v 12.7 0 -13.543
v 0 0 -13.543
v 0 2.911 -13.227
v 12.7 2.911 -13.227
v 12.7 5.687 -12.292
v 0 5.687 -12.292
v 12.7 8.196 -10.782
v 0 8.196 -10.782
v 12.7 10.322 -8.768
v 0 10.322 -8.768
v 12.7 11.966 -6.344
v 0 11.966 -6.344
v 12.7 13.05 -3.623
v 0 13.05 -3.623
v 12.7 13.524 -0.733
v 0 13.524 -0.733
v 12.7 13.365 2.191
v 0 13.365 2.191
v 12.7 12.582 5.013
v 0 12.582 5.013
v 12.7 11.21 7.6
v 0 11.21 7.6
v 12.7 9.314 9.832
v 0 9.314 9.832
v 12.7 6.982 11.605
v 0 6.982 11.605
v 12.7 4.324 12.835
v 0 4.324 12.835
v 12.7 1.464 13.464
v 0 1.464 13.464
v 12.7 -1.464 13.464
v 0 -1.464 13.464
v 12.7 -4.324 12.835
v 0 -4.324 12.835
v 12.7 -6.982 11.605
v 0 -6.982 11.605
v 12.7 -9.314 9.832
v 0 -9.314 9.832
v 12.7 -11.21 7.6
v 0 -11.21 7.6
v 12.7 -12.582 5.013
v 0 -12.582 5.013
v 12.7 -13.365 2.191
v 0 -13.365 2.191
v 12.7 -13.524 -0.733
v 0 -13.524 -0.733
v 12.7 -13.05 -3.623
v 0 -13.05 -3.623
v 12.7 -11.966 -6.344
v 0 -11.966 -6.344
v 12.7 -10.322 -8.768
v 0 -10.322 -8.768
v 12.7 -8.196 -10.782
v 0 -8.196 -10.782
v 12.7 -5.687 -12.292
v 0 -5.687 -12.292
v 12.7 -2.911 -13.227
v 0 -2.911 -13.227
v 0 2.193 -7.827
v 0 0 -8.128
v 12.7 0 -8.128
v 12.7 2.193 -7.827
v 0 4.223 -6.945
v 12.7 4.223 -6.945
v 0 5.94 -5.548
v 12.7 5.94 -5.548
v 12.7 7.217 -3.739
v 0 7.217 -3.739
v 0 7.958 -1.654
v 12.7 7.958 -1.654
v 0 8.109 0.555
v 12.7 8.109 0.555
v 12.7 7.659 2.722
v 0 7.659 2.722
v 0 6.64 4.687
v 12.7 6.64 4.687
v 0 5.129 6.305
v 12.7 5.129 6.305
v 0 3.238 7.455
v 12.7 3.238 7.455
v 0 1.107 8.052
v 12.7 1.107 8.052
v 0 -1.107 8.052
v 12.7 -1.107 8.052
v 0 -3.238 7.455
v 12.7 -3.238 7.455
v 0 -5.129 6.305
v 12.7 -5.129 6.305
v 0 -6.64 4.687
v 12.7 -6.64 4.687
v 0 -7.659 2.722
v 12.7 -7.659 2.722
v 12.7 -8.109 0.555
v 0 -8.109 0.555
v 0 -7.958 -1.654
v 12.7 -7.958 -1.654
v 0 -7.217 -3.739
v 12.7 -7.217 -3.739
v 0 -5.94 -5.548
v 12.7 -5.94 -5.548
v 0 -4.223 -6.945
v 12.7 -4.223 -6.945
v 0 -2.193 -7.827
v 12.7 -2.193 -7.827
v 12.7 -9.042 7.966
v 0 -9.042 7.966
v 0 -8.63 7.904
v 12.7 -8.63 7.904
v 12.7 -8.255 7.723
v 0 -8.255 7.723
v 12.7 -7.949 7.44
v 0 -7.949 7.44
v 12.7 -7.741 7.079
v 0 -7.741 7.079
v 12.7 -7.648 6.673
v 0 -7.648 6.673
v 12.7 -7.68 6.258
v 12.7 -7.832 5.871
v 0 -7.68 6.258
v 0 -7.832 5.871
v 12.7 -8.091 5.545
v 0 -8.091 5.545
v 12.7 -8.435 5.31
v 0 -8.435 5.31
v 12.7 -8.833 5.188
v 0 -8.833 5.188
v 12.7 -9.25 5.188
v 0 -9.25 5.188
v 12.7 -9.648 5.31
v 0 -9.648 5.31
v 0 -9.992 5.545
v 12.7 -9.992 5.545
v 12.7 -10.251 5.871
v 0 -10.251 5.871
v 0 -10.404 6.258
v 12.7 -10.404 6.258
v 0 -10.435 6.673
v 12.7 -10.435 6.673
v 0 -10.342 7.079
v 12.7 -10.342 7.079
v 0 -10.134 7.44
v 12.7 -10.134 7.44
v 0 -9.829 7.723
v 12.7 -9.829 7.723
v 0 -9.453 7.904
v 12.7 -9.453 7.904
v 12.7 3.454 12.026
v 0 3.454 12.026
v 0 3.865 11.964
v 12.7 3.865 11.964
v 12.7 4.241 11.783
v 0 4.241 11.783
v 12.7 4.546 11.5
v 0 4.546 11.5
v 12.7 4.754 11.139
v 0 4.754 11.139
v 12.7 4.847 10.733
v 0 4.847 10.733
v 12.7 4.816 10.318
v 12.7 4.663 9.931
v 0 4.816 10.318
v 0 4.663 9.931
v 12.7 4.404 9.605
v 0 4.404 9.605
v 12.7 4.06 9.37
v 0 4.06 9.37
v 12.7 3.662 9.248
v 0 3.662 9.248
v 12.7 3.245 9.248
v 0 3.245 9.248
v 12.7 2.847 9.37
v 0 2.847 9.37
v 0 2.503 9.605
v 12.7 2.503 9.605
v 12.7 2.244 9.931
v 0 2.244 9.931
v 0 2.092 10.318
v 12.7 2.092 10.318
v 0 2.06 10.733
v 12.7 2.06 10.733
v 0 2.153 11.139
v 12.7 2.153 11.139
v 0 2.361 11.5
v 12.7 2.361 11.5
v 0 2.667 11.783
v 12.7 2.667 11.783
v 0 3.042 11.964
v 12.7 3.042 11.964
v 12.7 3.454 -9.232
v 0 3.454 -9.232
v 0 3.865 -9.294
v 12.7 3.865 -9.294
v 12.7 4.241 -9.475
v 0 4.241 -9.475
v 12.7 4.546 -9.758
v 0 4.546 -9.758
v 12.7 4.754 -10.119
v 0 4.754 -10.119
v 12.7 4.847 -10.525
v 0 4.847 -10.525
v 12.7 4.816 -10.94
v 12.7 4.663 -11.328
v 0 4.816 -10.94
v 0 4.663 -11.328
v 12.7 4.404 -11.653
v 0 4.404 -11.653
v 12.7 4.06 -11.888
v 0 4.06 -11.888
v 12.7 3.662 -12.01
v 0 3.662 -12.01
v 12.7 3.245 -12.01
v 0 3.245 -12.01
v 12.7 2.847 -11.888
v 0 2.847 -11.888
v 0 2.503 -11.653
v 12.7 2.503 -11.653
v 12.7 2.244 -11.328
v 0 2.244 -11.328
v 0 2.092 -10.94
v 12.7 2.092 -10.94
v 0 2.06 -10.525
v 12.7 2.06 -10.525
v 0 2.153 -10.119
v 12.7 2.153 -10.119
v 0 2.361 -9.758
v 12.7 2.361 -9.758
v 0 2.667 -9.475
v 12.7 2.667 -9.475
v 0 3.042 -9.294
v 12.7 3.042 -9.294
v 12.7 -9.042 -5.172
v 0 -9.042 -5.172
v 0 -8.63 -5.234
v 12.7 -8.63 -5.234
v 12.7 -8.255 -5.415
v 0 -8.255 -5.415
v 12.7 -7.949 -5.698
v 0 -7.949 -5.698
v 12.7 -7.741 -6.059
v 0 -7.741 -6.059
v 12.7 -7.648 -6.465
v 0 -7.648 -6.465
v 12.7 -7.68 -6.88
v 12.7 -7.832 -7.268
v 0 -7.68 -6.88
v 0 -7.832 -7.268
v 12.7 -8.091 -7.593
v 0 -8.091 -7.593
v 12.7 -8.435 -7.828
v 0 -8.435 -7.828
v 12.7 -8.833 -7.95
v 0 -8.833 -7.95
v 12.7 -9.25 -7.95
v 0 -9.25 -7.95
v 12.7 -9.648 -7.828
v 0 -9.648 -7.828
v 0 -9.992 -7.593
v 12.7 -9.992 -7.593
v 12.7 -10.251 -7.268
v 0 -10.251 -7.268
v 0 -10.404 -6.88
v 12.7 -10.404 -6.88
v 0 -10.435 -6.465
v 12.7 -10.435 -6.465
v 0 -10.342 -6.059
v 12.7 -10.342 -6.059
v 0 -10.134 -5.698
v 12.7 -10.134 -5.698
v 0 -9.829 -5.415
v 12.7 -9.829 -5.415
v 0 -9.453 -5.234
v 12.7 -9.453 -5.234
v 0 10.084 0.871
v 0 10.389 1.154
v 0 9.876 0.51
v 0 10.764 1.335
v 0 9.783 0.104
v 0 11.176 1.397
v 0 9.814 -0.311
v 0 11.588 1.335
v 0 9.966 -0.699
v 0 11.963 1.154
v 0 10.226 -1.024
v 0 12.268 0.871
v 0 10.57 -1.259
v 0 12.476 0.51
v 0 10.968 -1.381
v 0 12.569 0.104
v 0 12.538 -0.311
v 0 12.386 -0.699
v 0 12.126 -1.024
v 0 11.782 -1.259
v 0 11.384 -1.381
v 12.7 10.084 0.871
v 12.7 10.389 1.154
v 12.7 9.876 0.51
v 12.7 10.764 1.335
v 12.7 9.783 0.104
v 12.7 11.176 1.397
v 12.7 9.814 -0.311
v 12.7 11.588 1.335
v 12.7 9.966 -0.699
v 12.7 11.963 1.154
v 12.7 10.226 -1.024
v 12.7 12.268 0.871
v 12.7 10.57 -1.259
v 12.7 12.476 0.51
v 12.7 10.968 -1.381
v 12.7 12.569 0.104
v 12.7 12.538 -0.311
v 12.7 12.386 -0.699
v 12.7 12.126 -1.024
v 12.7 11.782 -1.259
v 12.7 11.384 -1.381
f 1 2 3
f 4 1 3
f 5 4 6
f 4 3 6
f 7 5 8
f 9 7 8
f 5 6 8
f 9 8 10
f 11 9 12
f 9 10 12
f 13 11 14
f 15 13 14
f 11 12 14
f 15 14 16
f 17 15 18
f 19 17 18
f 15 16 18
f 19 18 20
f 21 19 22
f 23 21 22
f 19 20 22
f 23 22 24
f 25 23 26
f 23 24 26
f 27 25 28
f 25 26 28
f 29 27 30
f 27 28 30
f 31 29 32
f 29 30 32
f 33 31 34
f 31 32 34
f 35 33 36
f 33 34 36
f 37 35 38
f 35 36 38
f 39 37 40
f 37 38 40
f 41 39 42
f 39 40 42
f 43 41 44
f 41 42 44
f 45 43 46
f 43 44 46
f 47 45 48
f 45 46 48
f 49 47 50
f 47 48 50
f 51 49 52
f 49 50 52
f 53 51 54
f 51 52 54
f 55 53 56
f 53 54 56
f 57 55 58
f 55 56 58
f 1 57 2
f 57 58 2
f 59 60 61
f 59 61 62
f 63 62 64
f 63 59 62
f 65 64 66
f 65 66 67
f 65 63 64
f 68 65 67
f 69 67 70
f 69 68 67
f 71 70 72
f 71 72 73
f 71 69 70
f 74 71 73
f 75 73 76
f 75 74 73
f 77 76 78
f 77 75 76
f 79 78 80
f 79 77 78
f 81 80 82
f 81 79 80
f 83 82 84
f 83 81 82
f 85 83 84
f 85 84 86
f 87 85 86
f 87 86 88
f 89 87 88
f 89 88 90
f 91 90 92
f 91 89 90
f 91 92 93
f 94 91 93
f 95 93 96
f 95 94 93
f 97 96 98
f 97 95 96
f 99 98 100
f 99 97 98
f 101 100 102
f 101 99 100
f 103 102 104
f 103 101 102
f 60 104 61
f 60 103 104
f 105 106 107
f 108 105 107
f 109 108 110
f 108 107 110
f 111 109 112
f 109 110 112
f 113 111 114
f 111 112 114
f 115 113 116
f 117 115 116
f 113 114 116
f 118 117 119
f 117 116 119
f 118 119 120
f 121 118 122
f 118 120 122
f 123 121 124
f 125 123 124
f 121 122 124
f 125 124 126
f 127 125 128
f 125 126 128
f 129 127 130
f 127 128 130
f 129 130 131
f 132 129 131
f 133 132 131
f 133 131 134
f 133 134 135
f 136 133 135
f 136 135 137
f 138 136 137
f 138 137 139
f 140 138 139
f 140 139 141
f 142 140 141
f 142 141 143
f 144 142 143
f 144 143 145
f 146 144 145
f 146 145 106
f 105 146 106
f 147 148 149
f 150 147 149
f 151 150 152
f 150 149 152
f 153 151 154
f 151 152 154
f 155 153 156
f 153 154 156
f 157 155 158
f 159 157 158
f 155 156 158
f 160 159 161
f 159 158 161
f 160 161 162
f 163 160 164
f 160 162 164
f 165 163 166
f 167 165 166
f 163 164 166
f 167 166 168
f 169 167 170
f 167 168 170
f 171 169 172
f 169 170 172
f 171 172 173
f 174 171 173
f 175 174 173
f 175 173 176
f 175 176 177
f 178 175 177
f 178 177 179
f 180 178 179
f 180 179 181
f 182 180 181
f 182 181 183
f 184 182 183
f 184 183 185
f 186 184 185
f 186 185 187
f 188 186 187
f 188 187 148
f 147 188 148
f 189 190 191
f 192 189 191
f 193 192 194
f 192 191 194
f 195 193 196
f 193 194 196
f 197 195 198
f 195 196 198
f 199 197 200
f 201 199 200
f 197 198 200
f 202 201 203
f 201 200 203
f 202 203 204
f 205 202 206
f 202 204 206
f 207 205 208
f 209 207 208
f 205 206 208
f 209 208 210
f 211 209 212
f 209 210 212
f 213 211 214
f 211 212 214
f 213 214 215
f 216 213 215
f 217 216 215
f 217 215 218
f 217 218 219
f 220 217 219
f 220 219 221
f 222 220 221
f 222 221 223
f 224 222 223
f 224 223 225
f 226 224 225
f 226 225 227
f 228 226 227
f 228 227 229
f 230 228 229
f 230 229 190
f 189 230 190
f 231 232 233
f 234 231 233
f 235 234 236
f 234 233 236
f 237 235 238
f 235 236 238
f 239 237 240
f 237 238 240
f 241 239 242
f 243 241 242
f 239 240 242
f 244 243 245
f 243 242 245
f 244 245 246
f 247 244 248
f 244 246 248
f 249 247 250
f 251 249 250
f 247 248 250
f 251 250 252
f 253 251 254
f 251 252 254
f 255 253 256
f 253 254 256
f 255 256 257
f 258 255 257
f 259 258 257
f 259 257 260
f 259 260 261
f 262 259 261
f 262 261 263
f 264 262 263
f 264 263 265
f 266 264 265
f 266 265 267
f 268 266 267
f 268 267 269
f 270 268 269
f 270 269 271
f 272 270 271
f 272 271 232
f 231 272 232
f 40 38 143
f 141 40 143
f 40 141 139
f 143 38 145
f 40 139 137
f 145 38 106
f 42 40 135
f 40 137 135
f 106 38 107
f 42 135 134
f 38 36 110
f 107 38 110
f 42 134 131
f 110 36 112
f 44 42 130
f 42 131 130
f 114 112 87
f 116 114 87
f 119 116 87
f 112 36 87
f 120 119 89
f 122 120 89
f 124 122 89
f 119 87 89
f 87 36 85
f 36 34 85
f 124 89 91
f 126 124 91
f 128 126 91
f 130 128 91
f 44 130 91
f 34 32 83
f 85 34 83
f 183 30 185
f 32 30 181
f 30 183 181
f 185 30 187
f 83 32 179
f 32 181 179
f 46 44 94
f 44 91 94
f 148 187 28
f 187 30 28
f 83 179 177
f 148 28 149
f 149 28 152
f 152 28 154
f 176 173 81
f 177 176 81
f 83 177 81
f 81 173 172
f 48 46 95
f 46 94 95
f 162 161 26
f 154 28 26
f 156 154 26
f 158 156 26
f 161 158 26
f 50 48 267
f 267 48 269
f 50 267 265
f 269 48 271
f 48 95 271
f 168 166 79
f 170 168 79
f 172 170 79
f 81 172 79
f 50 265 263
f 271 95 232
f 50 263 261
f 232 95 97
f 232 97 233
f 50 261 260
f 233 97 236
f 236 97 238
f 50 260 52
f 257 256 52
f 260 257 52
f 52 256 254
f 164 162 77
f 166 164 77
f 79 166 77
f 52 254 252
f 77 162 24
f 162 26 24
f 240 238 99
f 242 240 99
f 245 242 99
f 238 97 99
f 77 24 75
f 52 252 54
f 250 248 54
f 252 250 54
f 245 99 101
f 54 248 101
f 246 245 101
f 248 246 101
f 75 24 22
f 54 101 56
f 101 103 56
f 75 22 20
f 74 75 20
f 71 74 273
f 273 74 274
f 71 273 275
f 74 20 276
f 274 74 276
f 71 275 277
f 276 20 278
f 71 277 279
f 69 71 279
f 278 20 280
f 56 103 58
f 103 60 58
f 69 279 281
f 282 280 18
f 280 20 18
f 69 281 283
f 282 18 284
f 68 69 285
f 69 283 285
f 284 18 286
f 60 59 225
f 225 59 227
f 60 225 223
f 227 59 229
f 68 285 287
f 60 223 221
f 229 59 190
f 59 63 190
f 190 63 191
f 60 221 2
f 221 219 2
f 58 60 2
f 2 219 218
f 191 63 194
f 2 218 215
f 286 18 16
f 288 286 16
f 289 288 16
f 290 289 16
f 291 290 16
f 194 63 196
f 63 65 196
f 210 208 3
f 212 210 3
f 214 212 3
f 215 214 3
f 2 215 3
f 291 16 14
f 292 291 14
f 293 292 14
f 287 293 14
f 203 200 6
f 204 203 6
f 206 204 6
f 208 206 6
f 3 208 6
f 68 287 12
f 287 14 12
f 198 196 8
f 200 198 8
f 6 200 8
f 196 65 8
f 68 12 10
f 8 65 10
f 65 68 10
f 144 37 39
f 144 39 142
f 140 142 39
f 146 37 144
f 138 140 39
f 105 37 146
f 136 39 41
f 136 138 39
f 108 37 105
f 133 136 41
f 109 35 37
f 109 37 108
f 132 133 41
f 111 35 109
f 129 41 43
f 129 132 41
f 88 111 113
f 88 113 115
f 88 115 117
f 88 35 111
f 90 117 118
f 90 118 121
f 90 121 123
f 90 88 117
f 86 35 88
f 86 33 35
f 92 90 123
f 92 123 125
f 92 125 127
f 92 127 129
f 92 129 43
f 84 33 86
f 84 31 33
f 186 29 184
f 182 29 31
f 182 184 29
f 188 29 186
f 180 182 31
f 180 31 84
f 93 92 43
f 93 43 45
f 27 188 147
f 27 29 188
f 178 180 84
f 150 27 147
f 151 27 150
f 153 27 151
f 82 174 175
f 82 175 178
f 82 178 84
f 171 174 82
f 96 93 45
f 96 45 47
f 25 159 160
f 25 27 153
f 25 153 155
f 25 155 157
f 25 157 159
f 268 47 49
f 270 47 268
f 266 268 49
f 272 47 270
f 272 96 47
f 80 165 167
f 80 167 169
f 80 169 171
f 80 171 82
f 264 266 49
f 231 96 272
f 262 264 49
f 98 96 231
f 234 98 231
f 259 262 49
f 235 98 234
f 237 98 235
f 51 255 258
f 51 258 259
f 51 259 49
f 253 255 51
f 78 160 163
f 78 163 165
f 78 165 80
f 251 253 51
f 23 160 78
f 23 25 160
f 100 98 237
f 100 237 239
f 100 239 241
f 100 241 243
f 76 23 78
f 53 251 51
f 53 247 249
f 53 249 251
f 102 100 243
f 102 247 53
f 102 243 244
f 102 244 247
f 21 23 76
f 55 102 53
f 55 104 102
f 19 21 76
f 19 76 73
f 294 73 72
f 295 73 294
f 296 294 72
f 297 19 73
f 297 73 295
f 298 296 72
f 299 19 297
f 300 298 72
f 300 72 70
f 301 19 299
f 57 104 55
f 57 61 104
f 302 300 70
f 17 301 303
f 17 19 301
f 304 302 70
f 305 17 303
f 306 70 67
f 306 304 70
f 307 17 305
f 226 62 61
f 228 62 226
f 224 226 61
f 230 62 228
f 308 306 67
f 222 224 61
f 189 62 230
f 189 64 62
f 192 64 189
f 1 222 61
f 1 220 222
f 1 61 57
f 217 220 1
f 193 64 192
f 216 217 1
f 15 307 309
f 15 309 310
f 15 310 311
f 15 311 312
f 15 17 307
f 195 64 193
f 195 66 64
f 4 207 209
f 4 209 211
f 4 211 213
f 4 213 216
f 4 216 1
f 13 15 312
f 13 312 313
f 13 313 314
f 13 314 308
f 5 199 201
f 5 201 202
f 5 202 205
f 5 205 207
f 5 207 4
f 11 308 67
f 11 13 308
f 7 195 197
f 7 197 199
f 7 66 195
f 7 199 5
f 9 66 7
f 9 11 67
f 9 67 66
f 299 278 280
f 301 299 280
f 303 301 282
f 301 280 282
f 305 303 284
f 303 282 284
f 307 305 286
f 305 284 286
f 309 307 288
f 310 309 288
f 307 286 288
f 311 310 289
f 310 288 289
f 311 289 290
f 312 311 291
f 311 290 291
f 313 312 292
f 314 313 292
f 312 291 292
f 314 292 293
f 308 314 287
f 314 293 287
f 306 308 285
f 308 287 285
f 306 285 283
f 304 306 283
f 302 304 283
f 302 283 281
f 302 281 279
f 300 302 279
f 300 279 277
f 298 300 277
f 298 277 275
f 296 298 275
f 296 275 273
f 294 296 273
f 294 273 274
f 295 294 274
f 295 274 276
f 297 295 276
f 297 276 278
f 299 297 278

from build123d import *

# Parameters (mm, degrees)
SKETCH1_R           = 13.543461356
SKETCH1_R_2         = 8.128
BOSS_EXTRUDE1_DEPTH = 12.7
SKETCH2_R           = 1.397
CUT_EXTRUDE1_DEPTH  = 13.7


with BuildPart() as part:
    # Sketch1 → Boss-Extrude1 (new body)
    with BuildSketch(Plane(origin=(0, 0, 0), x_dir=(0, 0, -1), z_dir=(1, 0, 0))):
        Circle(SKETCH1_R)
        Circle(SKETCH1_R_2, mode=Mode.SUBTRACT)
    extrude(amount=BOSS_EXTRUDE1_DEPTH)

    # Sketch2 → Cut-Extrude1 (cut, through all)
    with BuildSketch(Plane.ZY):
        with Locations((0, 11.176)):
            Circle(SKETCH2_R)
        with Locations((10.629007626, 3.453573929)):
            Circle(SKETCH2_R)
        with Locations((6.56908798, -9.041573929)):
            Circle(SKETCH2_R)
        with Locations((-6.56908798, -9.041573929)):
            Circle(SKETCH2_R)
        with Locations((-10.629007626, 3.453573929)):
            Circle(SKETCH2_R)
    extrude(amount=-CUT_EXTRUDE1_DEPTH, mode=Mode.SUBTRACT)


solid = part.part
